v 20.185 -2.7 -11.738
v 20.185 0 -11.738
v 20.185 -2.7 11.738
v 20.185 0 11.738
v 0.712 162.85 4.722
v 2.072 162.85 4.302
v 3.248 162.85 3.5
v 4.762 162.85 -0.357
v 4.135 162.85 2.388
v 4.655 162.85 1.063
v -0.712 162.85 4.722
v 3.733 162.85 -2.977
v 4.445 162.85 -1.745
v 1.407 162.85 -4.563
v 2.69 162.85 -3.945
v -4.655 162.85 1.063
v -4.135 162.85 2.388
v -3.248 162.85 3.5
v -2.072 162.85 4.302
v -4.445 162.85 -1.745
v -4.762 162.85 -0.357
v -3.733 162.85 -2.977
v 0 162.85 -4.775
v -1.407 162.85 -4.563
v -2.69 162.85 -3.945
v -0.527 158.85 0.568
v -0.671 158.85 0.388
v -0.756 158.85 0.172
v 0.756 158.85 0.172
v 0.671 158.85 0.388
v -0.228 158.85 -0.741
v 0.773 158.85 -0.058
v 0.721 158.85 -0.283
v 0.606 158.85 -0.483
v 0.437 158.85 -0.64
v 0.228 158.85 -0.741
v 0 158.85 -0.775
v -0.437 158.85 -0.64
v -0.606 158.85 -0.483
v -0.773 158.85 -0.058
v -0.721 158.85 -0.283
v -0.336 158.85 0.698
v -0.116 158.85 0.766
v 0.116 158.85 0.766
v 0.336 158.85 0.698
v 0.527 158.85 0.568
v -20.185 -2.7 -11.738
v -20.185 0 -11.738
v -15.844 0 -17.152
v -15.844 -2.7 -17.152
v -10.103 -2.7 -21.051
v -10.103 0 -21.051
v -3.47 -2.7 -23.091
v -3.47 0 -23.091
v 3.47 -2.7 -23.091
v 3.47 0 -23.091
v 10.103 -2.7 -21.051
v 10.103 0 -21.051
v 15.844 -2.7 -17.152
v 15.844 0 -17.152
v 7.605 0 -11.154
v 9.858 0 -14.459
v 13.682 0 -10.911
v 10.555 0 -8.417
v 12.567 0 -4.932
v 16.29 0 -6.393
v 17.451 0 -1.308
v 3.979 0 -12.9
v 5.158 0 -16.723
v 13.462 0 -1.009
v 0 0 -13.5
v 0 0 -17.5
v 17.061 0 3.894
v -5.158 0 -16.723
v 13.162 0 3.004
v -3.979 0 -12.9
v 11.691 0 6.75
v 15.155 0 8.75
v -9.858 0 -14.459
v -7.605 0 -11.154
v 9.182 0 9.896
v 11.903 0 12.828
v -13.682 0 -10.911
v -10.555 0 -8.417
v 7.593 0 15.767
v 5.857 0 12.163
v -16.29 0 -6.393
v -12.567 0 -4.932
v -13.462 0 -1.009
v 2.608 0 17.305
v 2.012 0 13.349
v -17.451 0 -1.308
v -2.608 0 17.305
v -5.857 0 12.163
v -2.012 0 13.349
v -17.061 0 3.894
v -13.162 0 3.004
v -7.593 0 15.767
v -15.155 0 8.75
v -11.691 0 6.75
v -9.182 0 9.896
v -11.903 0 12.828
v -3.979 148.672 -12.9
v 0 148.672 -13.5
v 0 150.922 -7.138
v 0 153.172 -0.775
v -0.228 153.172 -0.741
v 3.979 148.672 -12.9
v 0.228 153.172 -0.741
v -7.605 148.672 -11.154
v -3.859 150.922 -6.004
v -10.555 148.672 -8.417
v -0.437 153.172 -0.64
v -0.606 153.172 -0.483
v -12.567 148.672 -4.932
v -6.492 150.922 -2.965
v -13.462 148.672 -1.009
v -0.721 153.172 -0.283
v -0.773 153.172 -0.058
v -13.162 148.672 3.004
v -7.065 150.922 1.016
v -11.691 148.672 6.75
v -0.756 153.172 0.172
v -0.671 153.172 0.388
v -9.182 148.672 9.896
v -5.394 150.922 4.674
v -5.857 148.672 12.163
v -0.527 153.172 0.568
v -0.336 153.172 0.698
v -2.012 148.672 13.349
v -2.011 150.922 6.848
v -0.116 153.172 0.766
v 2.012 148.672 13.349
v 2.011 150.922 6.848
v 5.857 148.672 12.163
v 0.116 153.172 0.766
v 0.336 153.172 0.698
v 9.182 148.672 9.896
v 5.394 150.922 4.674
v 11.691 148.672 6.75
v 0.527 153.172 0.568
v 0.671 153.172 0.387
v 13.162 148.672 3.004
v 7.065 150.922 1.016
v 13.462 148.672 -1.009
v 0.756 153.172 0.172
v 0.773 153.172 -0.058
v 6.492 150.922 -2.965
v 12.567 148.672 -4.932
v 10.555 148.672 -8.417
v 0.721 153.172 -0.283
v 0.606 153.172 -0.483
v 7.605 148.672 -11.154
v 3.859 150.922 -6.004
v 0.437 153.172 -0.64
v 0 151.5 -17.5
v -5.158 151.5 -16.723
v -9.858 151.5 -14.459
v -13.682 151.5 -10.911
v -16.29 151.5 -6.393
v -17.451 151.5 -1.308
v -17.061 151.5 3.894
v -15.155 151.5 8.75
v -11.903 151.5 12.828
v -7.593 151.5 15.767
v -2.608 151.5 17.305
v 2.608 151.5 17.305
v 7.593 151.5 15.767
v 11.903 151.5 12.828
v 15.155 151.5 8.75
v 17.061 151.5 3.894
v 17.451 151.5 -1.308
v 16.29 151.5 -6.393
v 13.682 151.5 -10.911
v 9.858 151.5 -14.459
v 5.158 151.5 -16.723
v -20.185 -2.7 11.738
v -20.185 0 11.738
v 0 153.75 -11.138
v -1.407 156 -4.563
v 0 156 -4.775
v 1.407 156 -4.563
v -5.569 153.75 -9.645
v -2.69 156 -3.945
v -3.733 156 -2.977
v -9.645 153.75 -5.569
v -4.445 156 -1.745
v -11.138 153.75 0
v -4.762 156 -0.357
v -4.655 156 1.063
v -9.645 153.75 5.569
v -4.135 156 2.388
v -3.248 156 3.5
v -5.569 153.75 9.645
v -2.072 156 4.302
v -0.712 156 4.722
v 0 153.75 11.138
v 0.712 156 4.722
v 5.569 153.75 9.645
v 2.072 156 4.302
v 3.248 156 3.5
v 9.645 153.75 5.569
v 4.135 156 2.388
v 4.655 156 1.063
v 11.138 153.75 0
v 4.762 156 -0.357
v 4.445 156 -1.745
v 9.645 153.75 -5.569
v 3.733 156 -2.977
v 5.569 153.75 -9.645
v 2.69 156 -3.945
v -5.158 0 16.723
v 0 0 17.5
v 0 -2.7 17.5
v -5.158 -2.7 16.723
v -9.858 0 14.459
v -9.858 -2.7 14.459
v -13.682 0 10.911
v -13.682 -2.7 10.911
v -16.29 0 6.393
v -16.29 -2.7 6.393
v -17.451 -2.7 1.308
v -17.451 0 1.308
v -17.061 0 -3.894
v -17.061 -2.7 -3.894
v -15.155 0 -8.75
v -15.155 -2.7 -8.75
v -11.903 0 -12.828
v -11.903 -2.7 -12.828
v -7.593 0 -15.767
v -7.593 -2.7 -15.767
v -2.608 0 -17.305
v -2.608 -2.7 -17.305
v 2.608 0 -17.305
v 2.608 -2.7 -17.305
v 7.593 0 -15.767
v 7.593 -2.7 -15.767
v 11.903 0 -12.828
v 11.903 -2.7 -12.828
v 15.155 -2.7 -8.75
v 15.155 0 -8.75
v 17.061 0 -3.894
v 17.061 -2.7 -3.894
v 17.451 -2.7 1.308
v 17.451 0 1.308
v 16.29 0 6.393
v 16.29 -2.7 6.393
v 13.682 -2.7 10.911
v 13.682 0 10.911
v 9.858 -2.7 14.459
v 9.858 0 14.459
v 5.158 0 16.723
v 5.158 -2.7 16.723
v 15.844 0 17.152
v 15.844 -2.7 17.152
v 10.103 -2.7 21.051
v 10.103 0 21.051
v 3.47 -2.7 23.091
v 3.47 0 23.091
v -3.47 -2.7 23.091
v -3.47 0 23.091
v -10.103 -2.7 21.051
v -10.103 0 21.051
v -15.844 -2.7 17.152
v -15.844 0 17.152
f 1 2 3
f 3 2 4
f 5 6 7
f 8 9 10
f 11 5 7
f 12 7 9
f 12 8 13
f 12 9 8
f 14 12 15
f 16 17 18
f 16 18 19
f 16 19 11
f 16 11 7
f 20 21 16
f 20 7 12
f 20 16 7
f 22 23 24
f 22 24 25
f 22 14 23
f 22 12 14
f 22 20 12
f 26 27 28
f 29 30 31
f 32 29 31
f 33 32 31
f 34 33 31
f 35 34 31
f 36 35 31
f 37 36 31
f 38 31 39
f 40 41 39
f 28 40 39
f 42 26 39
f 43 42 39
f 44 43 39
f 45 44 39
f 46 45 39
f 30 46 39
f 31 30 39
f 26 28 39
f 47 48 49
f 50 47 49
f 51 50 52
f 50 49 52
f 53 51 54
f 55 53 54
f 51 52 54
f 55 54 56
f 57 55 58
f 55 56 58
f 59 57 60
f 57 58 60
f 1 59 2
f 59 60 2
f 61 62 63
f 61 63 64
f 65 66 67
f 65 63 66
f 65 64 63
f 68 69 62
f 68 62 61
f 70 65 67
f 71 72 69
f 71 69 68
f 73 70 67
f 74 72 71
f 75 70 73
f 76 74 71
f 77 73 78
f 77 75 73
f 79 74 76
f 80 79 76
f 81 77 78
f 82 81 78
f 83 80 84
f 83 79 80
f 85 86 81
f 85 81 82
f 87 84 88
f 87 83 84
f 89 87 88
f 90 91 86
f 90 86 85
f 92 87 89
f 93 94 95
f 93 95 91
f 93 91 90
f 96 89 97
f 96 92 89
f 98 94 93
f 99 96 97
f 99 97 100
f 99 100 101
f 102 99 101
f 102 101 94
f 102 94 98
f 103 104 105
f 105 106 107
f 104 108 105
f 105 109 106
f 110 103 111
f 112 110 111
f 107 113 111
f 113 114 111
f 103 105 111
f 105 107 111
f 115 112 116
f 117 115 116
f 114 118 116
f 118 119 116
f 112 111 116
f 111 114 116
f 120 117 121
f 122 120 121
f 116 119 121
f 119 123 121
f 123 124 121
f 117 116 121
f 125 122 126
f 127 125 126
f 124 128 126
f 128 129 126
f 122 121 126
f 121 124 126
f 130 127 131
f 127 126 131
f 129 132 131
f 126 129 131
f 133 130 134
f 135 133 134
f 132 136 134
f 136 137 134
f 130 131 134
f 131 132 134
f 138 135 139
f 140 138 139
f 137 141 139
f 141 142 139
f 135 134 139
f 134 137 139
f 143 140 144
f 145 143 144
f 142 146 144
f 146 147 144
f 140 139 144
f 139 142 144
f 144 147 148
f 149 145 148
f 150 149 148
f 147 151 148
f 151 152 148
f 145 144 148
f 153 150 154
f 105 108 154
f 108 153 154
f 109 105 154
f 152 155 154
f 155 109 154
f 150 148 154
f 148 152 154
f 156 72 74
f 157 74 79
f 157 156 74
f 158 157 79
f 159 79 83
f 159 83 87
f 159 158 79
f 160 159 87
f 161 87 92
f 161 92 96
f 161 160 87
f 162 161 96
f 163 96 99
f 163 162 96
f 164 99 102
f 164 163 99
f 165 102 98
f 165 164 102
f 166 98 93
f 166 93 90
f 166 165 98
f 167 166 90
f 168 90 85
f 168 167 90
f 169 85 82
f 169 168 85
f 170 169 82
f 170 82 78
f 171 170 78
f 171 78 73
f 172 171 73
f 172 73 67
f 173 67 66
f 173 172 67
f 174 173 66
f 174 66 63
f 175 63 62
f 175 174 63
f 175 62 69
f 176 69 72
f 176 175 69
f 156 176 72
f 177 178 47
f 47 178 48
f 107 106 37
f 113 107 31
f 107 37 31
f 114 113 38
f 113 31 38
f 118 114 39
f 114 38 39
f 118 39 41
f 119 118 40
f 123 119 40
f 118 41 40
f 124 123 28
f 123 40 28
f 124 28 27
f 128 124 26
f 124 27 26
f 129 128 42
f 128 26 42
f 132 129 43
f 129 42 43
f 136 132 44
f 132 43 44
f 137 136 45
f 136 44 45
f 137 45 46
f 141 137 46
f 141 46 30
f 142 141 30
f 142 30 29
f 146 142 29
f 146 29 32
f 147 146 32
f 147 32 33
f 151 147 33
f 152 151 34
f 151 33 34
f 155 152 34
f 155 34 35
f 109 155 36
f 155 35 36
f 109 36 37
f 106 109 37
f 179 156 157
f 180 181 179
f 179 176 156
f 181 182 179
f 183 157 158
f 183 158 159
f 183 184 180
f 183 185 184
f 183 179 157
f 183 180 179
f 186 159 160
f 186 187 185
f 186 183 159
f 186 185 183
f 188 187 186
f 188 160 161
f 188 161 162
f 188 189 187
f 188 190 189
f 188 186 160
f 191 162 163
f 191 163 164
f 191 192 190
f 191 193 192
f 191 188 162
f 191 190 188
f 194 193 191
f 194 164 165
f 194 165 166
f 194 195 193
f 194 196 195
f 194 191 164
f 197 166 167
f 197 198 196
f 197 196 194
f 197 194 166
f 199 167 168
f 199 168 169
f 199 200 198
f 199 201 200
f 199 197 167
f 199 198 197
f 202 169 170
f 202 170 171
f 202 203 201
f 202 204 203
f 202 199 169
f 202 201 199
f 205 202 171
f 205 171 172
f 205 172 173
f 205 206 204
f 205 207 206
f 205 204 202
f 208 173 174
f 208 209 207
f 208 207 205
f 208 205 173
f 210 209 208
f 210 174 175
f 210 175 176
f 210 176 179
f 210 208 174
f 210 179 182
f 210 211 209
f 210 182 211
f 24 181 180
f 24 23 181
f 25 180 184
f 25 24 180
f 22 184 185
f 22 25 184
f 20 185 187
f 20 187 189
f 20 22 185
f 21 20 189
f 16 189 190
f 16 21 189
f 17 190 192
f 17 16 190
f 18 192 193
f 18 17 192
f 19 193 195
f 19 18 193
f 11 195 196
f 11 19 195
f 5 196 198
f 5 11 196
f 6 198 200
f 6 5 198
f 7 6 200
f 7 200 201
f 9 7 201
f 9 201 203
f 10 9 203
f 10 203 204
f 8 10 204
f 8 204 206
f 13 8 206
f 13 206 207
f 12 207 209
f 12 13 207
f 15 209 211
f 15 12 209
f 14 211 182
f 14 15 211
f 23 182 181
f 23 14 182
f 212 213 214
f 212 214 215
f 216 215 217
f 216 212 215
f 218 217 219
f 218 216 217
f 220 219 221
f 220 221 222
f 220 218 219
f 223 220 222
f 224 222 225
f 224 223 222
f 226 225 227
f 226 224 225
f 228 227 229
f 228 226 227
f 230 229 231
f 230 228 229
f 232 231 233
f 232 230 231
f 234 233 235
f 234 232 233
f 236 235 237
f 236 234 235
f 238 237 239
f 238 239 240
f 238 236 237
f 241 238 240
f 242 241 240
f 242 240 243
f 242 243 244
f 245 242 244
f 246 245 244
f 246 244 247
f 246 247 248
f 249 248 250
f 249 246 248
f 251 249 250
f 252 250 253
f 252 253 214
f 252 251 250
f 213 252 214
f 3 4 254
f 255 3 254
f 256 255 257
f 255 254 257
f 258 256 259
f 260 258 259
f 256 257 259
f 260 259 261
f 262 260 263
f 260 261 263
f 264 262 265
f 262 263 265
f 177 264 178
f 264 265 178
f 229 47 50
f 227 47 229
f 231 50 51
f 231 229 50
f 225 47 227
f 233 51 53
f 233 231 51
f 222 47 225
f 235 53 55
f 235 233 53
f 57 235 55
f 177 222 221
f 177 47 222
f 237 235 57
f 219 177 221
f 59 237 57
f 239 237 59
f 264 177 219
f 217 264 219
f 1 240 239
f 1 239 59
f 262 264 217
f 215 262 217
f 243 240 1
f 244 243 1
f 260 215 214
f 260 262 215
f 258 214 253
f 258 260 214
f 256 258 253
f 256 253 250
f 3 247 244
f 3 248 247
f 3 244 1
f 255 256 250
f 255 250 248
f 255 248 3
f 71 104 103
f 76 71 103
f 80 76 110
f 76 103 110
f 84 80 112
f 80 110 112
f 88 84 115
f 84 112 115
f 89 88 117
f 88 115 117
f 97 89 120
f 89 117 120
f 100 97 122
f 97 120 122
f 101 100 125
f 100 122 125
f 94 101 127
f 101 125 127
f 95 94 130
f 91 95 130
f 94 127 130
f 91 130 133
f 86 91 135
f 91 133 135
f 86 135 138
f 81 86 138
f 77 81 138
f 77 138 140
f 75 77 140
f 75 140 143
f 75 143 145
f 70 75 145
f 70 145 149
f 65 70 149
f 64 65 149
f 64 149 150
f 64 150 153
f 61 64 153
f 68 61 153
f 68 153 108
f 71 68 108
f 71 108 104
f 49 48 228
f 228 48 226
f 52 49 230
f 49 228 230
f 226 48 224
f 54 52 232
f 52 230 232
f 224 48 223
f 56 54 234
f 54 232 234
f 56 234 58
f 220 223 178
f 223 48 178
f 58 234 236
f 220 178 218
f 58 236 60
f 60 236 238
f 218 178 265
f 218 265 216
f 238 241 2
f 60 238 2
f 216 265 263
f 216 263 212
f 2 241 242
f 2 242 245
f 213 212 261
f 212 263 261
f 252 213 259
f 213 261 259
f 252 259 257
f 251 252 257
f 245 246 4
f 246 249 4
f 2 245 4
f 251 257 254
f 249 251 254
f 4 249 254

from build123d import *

# Parameters (mm, degrees)
SKETCH1_W           = 17.5
SKETCH1_H           = 151.5
SHELL1_T            = -4
SKETCH2_R           = 17.5
BOSS_EXTRUDE1_DEPTH = 2.7


with BuildPart() as part:
    # Sketch1 → Revolve1 (revolve)
    with BuildSketch(Plane.XY, mode=Mode.PRIVATE) as revolve1_sk:
        Polygon((4.775, 151.5), (4.775, 156), (4.775, 162.85), (0, 162.85), (0, 151.5), align=None)
        with Locations((8.75, 75.75)):
            Rectangle(SKETCH1_W, SKETCH1_H)
        Polygon((17.5, 151.5), (4.775, 156), (4.775, 151.5), align=None)
    revolve(revolve1_sk.sketch.rotate(Axis((0, 0, 0), (0, 1, 0)), 90), axis=Axis((0, 0, 0), (0, 1, 0)))

    # Shell1
    shell1_openings = [part.faces().sort_by_distance(p)[0] for p in [
        (0, 0, 0),
    ]]
    offset(amount=SHELL1_T, openings=shell1_openings, kind=Kind.INTERSECTION)


with BuildPart() as body_2:
    # Sketch2 → Boss-Extrude1 (new body)
    with BuildSketch(Plane.XZ):
        with BuildLine():
            Line((-20.185, 11.738325051), (-20.185, -11.738325051))
            ThreePointArc((-20.185, -11.738325051), (0, -23.35), (20.185, -11.738325051))
            Line((20.185, -11.738325051), (20.185, 11.738325051))
            ThreePointArc((20.185, 11.738325051), (0, 23.35), (-20.185, 11.738325051))
        make_face()
        with Locations(Location((0, 0, 0), (0, 0, 90))):
            Circle(SKETCH2_R, mode=Mode.SUBTRACT)
    extrude(amount=BOSS_EXTRUDE1_DEPTH)


solid = Compound([part.part, body_2.part])
